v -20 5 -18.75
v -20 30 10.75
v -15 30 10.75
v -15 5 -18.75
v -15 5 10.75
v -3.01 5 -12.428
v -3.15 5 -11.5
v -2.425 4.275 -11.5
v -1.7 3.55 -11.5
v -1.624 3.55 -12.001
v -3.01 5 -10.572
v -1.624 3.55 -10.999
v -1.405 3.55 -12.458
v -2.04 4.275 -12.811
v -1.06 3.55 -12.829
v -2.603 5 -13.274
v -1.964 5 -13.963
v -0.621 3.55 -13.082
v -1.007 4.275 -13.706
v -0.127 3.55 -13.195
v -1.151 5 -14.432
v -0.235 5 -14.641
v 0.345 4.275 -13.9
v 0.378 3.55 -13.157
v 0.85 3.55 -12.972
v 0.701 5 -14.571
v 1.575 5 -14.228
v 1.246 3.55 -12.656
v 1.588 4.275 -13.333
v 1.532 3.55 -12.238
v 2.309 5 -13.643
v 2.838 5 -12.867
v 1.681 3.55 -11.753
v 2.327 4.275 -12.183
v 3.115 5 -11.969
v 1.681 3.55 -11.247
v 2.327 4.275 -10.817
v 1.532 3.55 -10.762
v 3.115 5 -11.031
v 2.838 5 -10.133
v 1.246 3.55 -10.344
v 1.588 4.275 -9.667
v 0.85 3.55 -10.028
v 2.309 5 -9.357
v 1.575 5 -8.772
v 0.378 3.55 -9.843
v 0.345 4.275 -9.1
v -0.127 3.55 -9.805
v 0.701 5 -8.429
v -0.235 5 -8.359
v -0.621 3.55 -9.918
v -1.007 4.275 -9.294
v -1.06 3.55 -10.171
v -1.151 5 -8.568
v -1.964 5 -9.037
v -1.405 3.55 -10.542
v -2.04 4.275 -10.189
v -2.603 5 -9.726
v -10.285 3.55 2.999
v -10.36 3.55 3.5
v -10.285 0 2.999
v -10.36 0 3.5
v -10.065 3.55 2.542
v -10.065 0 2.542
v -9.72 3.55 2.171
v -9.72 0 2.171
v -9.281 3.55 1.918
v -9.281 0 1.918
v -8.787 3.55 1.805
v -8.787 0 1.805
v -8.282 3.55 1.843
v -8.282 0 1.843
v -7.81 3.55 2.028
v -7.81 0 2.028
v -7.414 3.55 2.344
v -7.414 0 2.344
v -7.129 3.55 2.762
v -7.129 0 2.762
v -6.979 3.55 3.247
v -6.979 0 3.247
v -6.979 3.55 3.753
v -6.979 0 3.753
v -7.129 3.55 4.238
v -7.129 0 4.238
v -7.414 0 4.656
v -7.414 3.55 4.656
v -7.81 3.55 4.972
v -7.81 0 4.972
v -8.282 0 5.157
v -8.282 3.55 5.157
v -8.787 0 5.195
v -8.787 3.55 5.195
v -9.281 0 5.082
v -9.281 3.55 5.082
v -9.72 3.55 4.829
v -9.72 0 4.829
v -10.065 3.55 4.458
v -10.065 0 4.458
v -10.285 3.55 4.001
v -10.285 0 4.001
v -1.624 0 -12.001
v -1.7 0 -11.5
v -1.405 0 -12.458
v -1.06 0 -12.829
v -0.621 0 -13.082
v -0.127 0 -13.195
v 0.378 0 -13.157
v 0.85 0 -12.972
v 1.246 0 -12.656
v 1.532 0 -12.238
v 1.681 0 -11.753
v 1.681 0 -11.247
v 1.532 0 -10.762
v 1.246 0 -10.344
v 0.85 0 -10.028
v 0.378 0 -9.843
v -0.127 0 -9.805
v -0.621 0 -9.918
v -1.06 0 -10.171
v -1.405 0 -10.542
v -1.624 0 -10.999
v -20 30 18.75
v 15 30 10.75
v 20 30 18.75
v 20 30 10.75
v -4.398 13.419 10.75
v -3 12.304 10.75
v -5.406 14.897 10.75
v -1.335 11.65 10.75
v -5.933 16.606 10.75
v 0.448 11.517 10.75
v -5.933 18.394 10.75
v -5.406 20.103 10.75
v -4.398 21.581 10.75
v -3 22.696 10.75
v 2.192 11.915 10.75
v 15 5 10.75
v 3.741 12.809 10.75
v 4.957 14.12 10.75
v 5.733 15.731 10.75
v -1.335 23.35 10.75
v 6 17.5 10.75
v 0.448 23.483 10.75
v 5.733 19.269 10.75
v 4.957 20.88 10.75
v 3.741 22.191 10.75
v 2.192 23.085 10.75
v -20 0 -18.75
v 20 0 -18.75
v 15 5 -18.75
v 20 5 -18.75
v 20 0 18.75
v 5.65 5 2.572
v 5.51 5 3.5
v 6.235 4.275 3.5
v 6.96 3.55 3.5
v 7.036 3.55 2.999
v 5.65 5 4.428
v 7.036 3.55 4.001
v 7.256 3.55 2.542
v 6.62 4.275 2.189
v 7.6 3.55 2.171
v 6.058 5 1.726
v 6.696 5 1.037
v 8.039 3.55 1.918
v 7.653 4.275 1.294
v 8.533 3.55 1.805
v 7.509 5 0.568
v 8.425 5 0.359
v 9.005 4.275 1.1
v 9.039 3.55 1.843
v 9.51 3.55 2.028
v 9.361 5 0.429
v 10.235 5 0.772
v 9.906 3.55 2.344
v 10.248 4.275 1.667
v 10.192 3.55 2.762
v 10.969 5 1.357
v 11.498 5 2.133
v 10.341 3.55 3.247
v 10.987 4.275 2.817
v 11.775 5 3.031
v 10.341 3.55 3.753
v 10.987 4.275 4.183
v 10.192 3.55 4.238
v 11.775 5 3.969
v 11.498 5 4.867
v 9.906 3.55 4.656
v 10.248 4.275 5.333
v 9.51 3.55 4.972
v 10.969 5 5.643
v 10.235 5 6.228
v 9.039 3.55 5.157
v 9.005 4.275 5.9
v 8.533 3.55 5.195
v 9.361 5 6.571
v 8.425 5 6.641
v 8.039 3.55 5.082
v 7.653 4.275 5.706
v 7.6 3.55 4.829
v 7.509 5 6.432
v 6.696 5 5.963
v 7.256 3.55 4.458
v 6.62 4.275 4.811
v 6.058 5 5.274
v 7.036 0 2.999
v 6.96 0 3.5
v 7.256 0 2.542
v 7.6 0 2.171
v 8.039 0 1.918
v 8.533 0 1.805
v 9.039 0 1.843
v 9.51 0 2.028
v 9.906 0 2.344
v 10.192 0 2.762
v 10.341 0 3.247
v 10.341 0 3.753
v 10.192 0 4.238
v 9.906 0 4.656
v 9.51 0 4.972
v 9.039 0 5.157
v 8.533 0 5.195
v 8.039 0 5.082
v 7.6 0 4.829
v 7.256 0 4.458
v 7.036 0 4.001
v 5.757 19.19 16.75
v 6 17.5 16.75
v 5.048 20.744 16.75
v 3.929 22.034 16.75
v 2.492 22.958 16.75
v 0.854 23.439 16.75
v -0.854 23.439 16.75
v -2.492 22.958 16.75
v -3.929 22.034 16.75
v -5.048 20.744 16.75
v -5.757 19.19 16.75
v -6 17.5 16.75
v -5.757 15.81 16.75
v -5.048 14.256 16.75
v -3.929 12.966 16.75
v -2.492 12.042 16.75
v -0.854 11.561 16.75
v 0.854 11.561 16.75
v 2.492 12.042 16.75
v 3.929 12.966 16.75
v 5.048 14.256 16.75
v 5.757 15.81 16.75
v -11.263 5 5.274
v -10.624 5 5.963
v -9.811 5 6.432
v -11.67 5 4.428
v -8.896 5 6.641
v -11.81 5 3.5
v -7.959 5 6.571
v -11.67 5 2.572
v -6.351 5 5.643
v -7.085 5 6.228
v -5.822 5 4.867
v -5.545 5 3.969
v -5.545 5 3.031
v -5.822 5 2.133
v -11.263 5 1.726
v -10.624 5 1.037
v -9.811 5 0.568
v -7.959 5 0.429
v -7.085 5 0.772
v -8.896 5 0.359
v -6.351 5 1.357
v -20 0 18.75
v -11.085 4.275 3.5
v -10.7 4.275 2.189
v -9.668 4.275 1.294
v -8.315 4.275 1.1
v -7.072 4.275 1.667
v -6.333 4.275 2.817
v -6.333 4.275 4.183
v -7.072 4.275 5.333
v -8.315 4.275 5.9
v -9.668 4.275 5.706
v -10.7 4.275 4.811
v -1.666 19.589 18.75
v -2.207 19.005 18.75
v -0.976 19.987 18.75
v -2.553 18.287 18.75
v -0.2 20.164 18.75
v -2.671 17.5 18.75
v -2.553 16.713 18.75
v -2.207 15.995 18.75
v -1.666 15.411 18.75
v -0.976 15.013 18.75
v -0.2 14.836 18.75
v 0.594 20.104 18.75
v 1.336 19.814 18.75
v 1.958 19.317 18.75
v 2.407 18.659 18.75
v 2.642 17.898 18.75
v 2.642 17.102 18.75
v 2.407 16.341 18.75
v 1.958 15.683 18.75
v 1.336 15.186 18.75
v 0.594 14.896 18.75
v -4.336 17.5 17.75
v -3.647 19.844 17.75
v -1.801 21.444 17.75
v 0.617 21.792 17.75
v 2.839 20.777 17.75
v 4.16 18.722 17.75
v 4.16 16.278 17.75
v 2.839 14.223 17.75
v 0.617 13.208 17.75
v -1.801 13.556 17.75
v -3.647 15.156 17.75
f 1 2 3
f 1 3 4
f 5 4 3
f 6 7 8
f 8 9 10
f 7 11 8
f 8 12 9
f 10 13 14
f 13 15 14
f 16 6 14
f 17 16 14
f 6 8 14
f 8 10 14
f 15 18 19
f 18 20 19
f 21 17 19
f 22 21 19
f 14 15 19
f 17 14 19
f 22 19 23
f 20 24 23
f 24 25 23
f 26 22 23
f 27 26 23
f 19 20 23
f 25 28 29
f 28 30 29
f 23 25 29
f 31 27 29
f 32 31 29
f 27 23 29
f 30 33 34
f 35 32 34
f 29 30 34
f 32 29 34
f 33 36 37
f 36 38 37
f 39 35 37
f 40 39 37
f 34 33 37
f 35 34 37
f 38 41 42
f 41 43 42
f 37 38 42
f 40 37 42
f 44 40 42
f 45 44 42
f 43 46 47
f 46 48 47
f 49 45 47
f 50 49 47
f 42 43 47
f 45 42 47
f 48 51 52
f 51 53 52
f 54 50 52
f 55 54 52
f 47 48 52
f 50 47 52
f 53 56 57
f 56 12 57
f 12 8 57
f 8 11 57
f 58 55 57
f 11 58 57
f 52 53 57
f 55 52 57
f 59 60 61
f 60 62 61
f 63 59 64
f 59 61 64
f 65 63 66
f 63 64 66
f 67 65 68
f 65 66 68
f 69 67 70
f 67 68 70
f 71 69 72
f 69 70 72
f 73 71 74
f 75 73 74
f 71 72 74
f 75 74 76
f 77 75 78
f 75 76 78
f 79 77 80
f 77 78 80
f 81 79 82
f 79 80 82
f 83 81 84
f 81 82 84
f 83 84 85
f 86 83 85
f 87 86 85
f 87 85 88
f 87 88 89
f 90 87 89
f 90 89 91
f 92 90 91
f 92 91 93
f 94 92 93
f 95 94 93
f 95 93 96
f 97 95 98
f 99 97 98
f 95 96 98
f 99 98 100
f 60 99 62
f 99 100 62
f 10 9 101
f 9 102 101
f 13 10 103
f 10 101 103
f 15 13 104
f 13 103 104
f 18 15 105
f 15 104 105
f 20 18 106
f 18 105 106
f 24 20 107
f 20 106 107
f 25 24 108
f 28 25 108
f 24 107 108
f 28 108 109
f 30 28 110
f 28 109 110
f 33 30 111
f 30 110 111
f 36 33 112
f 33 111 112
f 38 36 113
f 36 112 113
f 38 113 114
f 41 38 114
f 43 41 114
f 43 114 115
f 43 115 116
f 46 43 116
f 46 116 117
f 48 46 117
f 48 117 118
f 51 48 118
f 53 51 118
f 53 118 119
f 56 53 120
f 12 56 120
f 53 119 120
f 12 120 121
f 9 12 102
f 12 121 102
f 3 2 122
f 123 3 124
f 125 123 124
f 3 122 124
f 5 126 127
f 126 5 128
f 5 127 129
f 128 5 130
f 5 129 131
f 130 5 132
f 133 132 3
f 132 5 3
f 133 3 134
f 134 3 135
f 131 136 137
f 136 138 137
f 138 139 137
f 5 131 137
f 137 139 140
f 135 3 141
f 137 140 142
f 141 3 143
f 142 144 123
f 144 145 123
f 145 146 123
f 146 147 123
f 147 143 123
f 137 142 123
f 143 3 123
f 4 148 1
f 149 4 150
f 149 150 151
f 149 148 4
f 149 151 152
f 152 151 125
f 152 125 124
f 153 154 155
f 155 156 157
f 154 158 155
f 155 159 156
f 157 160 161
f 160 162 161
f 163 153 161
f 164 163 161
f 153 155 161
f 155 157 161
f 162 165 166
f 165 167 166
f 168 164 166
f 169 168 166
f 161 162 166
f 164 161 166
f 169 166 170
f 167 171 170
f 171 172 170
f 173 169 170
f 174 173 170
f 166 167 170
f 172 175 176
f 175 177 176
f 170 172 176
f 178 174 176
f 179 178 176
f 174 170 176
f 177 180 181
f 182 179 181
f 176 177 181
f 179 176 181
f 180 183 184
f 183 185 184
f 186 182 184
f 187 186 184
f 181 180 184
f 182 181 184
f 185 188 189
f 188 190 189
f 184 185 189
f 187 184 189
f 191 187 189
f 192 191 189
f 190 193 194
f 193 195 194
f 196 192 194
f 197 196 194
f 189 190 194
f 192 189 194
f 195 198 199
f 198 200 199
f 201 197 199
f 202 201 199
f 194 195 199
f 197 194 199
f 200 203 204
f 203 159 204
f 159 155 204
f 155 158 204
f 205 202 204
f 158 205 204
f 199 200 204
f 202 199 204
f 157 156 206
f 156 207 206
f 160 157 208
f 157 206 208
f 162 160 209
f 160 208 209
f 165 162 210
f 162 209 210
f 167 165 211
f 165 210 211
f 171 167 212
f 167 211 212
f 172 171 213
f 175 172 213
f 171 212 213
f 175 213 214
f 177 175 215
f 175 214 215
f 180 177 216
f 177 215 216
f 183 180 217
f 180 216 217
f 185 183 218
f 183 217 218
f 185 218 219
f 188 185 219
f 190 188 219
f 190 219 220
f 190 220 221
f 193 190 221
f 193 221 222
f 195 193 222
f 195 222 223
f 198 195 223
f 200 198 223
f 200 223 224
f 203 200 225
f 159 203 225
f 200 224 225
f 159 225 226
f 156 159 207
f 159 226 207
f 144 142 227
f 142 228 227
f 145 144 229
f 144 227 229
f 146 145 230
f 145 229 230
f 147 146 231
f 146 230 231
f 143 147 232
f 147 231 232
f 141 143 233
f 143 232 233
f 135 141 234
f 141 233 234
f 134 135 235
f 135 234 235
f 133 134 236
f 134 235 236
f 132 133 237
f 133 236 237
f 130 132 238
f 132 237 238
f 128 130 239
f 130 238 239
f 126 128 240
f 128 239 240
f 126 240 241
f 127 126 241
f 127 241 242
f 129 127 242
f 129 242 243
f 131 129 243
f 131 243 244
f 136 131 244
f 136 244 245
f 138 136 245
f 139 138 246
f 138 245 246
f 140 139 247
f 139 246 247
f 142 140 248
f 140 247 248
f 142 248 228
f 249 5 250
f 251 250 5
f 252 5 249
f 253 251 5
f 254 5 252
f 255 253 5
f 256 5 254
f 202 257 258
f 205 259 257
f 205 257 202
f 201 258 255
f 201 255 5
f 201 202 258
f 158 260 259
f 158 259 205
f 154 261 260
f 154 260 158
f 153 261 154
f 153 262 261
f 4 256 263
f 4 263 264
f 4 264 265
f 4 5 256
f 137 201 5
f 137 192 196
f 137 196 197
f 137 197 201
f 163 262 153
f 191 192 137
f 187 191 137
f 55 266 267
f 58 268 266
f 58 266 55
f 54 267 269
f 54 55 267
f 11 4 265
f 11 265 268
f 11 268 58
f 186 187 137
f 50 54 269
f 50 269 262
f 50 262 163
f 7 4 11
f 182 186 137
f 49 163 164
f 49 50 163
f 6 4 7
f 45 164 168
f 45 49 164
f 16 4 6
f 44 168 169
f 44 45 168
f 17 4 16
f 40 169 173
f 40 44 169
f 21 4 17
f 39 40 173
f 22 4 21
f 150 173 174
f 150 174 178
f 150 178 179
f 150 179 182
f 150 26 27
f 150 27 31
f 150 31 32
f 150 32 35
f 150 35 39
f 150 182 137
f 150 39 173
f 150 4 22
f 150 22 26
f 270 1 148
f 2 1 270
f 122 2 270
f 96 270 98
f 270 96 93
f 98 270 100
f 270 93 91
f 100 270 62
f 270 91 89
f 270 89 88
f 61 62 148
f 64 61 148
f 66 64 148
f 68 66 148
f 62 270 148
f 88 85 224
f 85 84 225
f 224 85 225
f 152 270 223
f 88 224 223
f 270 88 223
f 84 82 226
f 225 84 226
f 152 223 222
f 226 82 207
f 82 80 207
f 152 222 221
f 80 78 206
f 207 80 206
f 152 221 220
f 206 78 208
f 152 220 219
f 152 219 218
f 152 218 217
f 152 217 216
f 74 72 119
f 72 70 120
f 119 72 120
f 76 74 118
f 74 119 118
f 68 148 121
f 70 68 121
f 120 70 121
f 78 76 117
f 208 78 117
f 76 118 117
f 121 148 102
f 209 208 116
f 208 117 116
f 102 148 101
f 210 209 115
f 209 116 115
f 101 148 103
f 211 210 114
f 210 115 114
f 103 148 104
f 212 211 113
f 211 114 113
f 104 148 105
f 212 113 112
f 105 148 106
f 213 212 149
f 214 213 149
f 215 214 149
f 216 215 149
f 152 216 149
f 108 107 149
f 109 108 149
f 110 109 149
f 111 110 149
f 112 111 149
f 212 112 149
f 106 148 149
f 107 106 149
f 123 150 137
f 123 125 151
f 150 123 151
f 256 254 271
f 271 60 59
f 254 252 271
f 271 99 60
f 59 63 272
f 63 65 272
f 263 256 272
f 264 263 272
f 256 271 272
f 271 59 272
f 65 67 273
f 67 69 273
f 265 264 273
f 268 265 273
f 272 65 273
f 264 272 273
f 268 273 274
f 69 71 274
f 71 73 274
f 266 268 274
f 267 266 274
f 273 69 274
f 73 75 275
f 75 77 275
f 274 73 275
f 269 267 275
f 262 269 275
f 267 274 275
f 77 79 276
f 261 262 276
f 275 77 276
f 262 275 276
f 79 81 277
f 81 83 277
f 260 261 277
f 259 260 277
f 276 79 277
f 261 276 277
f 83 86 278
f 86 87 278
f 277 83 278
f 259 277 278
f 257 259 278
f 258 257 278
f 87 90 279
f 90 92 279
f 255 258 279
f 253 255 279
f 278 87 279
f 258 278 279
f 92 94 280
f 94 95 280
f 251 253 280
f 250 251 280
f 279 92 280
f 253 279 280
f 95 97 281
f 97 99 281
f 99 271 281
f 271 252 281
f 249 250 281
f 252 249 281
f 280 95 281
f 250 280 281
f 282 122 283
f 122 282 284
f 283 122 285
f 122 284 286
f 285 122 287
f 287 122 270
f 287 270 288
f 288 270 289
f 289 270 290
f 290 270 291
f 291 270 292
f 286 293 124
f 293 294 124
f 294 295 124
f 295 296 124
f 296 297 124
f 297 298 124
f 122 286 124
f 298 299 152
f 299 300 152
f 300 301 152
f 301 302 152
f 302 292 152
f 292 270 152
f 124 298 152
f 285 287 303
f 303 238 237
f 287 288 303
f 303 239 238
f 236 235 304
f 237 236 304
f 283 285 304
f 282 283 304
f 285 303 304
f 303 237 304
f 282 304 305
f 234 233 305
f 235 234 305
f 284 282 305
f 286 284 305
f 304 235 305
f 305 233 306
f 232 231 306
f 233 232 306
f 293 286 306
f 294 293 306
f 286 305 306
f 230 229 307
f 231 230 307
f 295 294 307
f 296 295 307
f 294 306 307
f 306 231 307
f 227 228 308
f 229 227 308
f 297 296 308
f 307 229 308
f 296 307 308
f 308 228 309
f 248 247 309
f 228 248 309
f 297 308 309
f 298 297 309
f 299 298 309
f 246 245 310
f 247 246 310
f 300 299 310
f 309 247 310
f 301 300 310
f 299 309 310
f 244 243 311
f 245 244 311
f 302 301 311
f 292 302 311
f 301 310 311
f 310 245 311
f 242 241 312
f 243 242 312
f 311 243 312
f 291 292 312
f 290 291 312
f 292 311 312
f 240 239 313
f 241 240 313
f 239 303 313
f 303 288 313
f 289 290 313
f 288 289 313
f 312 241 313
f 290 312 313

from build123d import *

# Parameters (mm, degrees)
SKETCH1_W                                       = 40
SKETCH1_H                                       = 37.5
BOSS_EXTRUDE1_DEPTH                             = 5
SKETCH2_W                                       = 40
SKETCH2_H                                       = 30
BOSS_EXTRUDE2_DEPTH                             = 8
BOSS_EXTRUDE3_DEPTH                             = 5
BOSS_EXTRUDE4_START                             = -40
BOSS_EXTRUDE4_DEPTH                             = 5
CSK_FOR_M3_FLAT_HEAD_MACHINE_SCREW1_D           = 3.4
CSK_FOR_M3_FLAT_HEAD_MACHINE_SCREW1_DEPTH       = 6
CSK_FOR_M3_FLAT_HEAD_MACHINE_SCREW1_CSINK_D     = 6.3
CSK_FOR_M3_FLAT_HEAD_MACHINE_SCREW1_CSINK_ANGLE = 90
CSK_FOR_M3_FLAT_HEAD_MACHINE_SCREW1_TIP         = 1.021463052
F_12_0_12_DIAMETER_HOLE1_D                      = 12
F_12_0_12_DIAMETER_HOLE1_DEPTH                  = 6
F_12_0_12_DIAMETER_HOLE1_TIP                    = 3.605163714


with BuildPart() as part:
    # Sketch1 → Boss-Extrude1 (new body)
    with BuildSketch(Plane(origin=(0, 0, 0), x_dir=(1, 0, 0), z_dir=(0, 1, 0))):
        Rectangle(SKETCH1_W, SKETCH1_H)
    extrude(amount=BOSS_EXTRUDE1_DEPTH)

    # Sketch2 → Boss-Extrude2 (add)
    with BuildSketch(Plane.XY.offset(18.75)):
        with Locations((0, 15)):
            Rectangle(SKETCH2_W, SKETCH2_H)
    extrude(amount=-BOSS_EXTRUDE2_DEPTH)

    # Sketch3 → Boss-Extrude3 (add)
    with BuildSketch(Plane(origin=(20, 0, 0), x_dir=(0, 0, -1), z_dir=(1, 0, 0))):
        Polygon((-10.75, 30), (18.75, 5), (-10.75, 5), align=None)
    extrude(amount=-BOSS_EXTRUDE3_DEPTH)

    # Sketch3<2> → Boss-Extrude4 (add)
    with BuildSketch(Plane(origin=(20, 0, 0), x_dir=(0, 0, -1), z_dir=(1, 0, 0)).offset(BOSS_EXTRUDE4_START)):
        Polygon((-10.75, 30), (18.75, 5), (-10.75, 5), align=None)
    extrude(amount=BOSS_EXTRUDE4_DEPTH)

    # CSK for M3 Flat Head Machine Screw1
    with Locations(Plane(origin=(0, 5, 0), x_dir=(1, 0, 0), z_dir=(0, 1, 0))):
        with Locations((8.660254038, -3.5), (0, 11.5), (-8.660254038, -3.5)):
            CounterSinkHole(CSK_FOR_M3_FLAT_HEAD_MACHINE_SCREW1_D / 2, CSK_FOR_M3_FLAT_HEAD_MACHINE_SCREW1_CSINK_D / 2, depth=CSK_FOR_M3_FLAT_HEAD_MACHINE_SCREW1_DEPTH, counter_sink_angle=CSK_FOR_M3_FLAT_HEAD_MACHINE_SCREW1_CSINK_ANGLE)
            with Locations((0, 0, -(CSK_FOR_M3_FLAT_HEAD_MACHINE_SCREW1_DEPTH + CSK_FOR_M3_FLAT_HEAD_MACHINE_SCREW1_TIP / 2))):  # 118° drill point
                Cone(0, CSK_FOR_M3_FLAT_HEAD_MACHINE_SCREW1_D / 2, CSK_FOR_M3_FLAT_HEAD_MACHINE_SCREW1_TIP, mode=Mode.SUBTRACT)

    # Ø12.0 (12) Diameter Hole1
    with Locations(Plane(origin=(0, 0, 10.75), x_dir=(-1, 0, 0), z_dir=(0, 0, -1))):
        with Locations((0, 17.5)):
            Hole(F_12_0_12_DIAMETER_HOLE1_D / 2, depth=F_12_0_12_DIAMETER_HOLE1_DEPTH)
            with Locations((0, 0, -(F_12_0_12_DIAMETER_HOLE1_DEPTH + F_12_0_12_DIAMETER_HOLE1_TIP / 2))):  # 118° drill point
                Cone(0, F_12_0_12_DIAMETER_HOLE1_D / 2, F_12_0_12_DIAMETER_HOLE1_TIP, mode=Mode.SUBTRACT)


solid = part.part
